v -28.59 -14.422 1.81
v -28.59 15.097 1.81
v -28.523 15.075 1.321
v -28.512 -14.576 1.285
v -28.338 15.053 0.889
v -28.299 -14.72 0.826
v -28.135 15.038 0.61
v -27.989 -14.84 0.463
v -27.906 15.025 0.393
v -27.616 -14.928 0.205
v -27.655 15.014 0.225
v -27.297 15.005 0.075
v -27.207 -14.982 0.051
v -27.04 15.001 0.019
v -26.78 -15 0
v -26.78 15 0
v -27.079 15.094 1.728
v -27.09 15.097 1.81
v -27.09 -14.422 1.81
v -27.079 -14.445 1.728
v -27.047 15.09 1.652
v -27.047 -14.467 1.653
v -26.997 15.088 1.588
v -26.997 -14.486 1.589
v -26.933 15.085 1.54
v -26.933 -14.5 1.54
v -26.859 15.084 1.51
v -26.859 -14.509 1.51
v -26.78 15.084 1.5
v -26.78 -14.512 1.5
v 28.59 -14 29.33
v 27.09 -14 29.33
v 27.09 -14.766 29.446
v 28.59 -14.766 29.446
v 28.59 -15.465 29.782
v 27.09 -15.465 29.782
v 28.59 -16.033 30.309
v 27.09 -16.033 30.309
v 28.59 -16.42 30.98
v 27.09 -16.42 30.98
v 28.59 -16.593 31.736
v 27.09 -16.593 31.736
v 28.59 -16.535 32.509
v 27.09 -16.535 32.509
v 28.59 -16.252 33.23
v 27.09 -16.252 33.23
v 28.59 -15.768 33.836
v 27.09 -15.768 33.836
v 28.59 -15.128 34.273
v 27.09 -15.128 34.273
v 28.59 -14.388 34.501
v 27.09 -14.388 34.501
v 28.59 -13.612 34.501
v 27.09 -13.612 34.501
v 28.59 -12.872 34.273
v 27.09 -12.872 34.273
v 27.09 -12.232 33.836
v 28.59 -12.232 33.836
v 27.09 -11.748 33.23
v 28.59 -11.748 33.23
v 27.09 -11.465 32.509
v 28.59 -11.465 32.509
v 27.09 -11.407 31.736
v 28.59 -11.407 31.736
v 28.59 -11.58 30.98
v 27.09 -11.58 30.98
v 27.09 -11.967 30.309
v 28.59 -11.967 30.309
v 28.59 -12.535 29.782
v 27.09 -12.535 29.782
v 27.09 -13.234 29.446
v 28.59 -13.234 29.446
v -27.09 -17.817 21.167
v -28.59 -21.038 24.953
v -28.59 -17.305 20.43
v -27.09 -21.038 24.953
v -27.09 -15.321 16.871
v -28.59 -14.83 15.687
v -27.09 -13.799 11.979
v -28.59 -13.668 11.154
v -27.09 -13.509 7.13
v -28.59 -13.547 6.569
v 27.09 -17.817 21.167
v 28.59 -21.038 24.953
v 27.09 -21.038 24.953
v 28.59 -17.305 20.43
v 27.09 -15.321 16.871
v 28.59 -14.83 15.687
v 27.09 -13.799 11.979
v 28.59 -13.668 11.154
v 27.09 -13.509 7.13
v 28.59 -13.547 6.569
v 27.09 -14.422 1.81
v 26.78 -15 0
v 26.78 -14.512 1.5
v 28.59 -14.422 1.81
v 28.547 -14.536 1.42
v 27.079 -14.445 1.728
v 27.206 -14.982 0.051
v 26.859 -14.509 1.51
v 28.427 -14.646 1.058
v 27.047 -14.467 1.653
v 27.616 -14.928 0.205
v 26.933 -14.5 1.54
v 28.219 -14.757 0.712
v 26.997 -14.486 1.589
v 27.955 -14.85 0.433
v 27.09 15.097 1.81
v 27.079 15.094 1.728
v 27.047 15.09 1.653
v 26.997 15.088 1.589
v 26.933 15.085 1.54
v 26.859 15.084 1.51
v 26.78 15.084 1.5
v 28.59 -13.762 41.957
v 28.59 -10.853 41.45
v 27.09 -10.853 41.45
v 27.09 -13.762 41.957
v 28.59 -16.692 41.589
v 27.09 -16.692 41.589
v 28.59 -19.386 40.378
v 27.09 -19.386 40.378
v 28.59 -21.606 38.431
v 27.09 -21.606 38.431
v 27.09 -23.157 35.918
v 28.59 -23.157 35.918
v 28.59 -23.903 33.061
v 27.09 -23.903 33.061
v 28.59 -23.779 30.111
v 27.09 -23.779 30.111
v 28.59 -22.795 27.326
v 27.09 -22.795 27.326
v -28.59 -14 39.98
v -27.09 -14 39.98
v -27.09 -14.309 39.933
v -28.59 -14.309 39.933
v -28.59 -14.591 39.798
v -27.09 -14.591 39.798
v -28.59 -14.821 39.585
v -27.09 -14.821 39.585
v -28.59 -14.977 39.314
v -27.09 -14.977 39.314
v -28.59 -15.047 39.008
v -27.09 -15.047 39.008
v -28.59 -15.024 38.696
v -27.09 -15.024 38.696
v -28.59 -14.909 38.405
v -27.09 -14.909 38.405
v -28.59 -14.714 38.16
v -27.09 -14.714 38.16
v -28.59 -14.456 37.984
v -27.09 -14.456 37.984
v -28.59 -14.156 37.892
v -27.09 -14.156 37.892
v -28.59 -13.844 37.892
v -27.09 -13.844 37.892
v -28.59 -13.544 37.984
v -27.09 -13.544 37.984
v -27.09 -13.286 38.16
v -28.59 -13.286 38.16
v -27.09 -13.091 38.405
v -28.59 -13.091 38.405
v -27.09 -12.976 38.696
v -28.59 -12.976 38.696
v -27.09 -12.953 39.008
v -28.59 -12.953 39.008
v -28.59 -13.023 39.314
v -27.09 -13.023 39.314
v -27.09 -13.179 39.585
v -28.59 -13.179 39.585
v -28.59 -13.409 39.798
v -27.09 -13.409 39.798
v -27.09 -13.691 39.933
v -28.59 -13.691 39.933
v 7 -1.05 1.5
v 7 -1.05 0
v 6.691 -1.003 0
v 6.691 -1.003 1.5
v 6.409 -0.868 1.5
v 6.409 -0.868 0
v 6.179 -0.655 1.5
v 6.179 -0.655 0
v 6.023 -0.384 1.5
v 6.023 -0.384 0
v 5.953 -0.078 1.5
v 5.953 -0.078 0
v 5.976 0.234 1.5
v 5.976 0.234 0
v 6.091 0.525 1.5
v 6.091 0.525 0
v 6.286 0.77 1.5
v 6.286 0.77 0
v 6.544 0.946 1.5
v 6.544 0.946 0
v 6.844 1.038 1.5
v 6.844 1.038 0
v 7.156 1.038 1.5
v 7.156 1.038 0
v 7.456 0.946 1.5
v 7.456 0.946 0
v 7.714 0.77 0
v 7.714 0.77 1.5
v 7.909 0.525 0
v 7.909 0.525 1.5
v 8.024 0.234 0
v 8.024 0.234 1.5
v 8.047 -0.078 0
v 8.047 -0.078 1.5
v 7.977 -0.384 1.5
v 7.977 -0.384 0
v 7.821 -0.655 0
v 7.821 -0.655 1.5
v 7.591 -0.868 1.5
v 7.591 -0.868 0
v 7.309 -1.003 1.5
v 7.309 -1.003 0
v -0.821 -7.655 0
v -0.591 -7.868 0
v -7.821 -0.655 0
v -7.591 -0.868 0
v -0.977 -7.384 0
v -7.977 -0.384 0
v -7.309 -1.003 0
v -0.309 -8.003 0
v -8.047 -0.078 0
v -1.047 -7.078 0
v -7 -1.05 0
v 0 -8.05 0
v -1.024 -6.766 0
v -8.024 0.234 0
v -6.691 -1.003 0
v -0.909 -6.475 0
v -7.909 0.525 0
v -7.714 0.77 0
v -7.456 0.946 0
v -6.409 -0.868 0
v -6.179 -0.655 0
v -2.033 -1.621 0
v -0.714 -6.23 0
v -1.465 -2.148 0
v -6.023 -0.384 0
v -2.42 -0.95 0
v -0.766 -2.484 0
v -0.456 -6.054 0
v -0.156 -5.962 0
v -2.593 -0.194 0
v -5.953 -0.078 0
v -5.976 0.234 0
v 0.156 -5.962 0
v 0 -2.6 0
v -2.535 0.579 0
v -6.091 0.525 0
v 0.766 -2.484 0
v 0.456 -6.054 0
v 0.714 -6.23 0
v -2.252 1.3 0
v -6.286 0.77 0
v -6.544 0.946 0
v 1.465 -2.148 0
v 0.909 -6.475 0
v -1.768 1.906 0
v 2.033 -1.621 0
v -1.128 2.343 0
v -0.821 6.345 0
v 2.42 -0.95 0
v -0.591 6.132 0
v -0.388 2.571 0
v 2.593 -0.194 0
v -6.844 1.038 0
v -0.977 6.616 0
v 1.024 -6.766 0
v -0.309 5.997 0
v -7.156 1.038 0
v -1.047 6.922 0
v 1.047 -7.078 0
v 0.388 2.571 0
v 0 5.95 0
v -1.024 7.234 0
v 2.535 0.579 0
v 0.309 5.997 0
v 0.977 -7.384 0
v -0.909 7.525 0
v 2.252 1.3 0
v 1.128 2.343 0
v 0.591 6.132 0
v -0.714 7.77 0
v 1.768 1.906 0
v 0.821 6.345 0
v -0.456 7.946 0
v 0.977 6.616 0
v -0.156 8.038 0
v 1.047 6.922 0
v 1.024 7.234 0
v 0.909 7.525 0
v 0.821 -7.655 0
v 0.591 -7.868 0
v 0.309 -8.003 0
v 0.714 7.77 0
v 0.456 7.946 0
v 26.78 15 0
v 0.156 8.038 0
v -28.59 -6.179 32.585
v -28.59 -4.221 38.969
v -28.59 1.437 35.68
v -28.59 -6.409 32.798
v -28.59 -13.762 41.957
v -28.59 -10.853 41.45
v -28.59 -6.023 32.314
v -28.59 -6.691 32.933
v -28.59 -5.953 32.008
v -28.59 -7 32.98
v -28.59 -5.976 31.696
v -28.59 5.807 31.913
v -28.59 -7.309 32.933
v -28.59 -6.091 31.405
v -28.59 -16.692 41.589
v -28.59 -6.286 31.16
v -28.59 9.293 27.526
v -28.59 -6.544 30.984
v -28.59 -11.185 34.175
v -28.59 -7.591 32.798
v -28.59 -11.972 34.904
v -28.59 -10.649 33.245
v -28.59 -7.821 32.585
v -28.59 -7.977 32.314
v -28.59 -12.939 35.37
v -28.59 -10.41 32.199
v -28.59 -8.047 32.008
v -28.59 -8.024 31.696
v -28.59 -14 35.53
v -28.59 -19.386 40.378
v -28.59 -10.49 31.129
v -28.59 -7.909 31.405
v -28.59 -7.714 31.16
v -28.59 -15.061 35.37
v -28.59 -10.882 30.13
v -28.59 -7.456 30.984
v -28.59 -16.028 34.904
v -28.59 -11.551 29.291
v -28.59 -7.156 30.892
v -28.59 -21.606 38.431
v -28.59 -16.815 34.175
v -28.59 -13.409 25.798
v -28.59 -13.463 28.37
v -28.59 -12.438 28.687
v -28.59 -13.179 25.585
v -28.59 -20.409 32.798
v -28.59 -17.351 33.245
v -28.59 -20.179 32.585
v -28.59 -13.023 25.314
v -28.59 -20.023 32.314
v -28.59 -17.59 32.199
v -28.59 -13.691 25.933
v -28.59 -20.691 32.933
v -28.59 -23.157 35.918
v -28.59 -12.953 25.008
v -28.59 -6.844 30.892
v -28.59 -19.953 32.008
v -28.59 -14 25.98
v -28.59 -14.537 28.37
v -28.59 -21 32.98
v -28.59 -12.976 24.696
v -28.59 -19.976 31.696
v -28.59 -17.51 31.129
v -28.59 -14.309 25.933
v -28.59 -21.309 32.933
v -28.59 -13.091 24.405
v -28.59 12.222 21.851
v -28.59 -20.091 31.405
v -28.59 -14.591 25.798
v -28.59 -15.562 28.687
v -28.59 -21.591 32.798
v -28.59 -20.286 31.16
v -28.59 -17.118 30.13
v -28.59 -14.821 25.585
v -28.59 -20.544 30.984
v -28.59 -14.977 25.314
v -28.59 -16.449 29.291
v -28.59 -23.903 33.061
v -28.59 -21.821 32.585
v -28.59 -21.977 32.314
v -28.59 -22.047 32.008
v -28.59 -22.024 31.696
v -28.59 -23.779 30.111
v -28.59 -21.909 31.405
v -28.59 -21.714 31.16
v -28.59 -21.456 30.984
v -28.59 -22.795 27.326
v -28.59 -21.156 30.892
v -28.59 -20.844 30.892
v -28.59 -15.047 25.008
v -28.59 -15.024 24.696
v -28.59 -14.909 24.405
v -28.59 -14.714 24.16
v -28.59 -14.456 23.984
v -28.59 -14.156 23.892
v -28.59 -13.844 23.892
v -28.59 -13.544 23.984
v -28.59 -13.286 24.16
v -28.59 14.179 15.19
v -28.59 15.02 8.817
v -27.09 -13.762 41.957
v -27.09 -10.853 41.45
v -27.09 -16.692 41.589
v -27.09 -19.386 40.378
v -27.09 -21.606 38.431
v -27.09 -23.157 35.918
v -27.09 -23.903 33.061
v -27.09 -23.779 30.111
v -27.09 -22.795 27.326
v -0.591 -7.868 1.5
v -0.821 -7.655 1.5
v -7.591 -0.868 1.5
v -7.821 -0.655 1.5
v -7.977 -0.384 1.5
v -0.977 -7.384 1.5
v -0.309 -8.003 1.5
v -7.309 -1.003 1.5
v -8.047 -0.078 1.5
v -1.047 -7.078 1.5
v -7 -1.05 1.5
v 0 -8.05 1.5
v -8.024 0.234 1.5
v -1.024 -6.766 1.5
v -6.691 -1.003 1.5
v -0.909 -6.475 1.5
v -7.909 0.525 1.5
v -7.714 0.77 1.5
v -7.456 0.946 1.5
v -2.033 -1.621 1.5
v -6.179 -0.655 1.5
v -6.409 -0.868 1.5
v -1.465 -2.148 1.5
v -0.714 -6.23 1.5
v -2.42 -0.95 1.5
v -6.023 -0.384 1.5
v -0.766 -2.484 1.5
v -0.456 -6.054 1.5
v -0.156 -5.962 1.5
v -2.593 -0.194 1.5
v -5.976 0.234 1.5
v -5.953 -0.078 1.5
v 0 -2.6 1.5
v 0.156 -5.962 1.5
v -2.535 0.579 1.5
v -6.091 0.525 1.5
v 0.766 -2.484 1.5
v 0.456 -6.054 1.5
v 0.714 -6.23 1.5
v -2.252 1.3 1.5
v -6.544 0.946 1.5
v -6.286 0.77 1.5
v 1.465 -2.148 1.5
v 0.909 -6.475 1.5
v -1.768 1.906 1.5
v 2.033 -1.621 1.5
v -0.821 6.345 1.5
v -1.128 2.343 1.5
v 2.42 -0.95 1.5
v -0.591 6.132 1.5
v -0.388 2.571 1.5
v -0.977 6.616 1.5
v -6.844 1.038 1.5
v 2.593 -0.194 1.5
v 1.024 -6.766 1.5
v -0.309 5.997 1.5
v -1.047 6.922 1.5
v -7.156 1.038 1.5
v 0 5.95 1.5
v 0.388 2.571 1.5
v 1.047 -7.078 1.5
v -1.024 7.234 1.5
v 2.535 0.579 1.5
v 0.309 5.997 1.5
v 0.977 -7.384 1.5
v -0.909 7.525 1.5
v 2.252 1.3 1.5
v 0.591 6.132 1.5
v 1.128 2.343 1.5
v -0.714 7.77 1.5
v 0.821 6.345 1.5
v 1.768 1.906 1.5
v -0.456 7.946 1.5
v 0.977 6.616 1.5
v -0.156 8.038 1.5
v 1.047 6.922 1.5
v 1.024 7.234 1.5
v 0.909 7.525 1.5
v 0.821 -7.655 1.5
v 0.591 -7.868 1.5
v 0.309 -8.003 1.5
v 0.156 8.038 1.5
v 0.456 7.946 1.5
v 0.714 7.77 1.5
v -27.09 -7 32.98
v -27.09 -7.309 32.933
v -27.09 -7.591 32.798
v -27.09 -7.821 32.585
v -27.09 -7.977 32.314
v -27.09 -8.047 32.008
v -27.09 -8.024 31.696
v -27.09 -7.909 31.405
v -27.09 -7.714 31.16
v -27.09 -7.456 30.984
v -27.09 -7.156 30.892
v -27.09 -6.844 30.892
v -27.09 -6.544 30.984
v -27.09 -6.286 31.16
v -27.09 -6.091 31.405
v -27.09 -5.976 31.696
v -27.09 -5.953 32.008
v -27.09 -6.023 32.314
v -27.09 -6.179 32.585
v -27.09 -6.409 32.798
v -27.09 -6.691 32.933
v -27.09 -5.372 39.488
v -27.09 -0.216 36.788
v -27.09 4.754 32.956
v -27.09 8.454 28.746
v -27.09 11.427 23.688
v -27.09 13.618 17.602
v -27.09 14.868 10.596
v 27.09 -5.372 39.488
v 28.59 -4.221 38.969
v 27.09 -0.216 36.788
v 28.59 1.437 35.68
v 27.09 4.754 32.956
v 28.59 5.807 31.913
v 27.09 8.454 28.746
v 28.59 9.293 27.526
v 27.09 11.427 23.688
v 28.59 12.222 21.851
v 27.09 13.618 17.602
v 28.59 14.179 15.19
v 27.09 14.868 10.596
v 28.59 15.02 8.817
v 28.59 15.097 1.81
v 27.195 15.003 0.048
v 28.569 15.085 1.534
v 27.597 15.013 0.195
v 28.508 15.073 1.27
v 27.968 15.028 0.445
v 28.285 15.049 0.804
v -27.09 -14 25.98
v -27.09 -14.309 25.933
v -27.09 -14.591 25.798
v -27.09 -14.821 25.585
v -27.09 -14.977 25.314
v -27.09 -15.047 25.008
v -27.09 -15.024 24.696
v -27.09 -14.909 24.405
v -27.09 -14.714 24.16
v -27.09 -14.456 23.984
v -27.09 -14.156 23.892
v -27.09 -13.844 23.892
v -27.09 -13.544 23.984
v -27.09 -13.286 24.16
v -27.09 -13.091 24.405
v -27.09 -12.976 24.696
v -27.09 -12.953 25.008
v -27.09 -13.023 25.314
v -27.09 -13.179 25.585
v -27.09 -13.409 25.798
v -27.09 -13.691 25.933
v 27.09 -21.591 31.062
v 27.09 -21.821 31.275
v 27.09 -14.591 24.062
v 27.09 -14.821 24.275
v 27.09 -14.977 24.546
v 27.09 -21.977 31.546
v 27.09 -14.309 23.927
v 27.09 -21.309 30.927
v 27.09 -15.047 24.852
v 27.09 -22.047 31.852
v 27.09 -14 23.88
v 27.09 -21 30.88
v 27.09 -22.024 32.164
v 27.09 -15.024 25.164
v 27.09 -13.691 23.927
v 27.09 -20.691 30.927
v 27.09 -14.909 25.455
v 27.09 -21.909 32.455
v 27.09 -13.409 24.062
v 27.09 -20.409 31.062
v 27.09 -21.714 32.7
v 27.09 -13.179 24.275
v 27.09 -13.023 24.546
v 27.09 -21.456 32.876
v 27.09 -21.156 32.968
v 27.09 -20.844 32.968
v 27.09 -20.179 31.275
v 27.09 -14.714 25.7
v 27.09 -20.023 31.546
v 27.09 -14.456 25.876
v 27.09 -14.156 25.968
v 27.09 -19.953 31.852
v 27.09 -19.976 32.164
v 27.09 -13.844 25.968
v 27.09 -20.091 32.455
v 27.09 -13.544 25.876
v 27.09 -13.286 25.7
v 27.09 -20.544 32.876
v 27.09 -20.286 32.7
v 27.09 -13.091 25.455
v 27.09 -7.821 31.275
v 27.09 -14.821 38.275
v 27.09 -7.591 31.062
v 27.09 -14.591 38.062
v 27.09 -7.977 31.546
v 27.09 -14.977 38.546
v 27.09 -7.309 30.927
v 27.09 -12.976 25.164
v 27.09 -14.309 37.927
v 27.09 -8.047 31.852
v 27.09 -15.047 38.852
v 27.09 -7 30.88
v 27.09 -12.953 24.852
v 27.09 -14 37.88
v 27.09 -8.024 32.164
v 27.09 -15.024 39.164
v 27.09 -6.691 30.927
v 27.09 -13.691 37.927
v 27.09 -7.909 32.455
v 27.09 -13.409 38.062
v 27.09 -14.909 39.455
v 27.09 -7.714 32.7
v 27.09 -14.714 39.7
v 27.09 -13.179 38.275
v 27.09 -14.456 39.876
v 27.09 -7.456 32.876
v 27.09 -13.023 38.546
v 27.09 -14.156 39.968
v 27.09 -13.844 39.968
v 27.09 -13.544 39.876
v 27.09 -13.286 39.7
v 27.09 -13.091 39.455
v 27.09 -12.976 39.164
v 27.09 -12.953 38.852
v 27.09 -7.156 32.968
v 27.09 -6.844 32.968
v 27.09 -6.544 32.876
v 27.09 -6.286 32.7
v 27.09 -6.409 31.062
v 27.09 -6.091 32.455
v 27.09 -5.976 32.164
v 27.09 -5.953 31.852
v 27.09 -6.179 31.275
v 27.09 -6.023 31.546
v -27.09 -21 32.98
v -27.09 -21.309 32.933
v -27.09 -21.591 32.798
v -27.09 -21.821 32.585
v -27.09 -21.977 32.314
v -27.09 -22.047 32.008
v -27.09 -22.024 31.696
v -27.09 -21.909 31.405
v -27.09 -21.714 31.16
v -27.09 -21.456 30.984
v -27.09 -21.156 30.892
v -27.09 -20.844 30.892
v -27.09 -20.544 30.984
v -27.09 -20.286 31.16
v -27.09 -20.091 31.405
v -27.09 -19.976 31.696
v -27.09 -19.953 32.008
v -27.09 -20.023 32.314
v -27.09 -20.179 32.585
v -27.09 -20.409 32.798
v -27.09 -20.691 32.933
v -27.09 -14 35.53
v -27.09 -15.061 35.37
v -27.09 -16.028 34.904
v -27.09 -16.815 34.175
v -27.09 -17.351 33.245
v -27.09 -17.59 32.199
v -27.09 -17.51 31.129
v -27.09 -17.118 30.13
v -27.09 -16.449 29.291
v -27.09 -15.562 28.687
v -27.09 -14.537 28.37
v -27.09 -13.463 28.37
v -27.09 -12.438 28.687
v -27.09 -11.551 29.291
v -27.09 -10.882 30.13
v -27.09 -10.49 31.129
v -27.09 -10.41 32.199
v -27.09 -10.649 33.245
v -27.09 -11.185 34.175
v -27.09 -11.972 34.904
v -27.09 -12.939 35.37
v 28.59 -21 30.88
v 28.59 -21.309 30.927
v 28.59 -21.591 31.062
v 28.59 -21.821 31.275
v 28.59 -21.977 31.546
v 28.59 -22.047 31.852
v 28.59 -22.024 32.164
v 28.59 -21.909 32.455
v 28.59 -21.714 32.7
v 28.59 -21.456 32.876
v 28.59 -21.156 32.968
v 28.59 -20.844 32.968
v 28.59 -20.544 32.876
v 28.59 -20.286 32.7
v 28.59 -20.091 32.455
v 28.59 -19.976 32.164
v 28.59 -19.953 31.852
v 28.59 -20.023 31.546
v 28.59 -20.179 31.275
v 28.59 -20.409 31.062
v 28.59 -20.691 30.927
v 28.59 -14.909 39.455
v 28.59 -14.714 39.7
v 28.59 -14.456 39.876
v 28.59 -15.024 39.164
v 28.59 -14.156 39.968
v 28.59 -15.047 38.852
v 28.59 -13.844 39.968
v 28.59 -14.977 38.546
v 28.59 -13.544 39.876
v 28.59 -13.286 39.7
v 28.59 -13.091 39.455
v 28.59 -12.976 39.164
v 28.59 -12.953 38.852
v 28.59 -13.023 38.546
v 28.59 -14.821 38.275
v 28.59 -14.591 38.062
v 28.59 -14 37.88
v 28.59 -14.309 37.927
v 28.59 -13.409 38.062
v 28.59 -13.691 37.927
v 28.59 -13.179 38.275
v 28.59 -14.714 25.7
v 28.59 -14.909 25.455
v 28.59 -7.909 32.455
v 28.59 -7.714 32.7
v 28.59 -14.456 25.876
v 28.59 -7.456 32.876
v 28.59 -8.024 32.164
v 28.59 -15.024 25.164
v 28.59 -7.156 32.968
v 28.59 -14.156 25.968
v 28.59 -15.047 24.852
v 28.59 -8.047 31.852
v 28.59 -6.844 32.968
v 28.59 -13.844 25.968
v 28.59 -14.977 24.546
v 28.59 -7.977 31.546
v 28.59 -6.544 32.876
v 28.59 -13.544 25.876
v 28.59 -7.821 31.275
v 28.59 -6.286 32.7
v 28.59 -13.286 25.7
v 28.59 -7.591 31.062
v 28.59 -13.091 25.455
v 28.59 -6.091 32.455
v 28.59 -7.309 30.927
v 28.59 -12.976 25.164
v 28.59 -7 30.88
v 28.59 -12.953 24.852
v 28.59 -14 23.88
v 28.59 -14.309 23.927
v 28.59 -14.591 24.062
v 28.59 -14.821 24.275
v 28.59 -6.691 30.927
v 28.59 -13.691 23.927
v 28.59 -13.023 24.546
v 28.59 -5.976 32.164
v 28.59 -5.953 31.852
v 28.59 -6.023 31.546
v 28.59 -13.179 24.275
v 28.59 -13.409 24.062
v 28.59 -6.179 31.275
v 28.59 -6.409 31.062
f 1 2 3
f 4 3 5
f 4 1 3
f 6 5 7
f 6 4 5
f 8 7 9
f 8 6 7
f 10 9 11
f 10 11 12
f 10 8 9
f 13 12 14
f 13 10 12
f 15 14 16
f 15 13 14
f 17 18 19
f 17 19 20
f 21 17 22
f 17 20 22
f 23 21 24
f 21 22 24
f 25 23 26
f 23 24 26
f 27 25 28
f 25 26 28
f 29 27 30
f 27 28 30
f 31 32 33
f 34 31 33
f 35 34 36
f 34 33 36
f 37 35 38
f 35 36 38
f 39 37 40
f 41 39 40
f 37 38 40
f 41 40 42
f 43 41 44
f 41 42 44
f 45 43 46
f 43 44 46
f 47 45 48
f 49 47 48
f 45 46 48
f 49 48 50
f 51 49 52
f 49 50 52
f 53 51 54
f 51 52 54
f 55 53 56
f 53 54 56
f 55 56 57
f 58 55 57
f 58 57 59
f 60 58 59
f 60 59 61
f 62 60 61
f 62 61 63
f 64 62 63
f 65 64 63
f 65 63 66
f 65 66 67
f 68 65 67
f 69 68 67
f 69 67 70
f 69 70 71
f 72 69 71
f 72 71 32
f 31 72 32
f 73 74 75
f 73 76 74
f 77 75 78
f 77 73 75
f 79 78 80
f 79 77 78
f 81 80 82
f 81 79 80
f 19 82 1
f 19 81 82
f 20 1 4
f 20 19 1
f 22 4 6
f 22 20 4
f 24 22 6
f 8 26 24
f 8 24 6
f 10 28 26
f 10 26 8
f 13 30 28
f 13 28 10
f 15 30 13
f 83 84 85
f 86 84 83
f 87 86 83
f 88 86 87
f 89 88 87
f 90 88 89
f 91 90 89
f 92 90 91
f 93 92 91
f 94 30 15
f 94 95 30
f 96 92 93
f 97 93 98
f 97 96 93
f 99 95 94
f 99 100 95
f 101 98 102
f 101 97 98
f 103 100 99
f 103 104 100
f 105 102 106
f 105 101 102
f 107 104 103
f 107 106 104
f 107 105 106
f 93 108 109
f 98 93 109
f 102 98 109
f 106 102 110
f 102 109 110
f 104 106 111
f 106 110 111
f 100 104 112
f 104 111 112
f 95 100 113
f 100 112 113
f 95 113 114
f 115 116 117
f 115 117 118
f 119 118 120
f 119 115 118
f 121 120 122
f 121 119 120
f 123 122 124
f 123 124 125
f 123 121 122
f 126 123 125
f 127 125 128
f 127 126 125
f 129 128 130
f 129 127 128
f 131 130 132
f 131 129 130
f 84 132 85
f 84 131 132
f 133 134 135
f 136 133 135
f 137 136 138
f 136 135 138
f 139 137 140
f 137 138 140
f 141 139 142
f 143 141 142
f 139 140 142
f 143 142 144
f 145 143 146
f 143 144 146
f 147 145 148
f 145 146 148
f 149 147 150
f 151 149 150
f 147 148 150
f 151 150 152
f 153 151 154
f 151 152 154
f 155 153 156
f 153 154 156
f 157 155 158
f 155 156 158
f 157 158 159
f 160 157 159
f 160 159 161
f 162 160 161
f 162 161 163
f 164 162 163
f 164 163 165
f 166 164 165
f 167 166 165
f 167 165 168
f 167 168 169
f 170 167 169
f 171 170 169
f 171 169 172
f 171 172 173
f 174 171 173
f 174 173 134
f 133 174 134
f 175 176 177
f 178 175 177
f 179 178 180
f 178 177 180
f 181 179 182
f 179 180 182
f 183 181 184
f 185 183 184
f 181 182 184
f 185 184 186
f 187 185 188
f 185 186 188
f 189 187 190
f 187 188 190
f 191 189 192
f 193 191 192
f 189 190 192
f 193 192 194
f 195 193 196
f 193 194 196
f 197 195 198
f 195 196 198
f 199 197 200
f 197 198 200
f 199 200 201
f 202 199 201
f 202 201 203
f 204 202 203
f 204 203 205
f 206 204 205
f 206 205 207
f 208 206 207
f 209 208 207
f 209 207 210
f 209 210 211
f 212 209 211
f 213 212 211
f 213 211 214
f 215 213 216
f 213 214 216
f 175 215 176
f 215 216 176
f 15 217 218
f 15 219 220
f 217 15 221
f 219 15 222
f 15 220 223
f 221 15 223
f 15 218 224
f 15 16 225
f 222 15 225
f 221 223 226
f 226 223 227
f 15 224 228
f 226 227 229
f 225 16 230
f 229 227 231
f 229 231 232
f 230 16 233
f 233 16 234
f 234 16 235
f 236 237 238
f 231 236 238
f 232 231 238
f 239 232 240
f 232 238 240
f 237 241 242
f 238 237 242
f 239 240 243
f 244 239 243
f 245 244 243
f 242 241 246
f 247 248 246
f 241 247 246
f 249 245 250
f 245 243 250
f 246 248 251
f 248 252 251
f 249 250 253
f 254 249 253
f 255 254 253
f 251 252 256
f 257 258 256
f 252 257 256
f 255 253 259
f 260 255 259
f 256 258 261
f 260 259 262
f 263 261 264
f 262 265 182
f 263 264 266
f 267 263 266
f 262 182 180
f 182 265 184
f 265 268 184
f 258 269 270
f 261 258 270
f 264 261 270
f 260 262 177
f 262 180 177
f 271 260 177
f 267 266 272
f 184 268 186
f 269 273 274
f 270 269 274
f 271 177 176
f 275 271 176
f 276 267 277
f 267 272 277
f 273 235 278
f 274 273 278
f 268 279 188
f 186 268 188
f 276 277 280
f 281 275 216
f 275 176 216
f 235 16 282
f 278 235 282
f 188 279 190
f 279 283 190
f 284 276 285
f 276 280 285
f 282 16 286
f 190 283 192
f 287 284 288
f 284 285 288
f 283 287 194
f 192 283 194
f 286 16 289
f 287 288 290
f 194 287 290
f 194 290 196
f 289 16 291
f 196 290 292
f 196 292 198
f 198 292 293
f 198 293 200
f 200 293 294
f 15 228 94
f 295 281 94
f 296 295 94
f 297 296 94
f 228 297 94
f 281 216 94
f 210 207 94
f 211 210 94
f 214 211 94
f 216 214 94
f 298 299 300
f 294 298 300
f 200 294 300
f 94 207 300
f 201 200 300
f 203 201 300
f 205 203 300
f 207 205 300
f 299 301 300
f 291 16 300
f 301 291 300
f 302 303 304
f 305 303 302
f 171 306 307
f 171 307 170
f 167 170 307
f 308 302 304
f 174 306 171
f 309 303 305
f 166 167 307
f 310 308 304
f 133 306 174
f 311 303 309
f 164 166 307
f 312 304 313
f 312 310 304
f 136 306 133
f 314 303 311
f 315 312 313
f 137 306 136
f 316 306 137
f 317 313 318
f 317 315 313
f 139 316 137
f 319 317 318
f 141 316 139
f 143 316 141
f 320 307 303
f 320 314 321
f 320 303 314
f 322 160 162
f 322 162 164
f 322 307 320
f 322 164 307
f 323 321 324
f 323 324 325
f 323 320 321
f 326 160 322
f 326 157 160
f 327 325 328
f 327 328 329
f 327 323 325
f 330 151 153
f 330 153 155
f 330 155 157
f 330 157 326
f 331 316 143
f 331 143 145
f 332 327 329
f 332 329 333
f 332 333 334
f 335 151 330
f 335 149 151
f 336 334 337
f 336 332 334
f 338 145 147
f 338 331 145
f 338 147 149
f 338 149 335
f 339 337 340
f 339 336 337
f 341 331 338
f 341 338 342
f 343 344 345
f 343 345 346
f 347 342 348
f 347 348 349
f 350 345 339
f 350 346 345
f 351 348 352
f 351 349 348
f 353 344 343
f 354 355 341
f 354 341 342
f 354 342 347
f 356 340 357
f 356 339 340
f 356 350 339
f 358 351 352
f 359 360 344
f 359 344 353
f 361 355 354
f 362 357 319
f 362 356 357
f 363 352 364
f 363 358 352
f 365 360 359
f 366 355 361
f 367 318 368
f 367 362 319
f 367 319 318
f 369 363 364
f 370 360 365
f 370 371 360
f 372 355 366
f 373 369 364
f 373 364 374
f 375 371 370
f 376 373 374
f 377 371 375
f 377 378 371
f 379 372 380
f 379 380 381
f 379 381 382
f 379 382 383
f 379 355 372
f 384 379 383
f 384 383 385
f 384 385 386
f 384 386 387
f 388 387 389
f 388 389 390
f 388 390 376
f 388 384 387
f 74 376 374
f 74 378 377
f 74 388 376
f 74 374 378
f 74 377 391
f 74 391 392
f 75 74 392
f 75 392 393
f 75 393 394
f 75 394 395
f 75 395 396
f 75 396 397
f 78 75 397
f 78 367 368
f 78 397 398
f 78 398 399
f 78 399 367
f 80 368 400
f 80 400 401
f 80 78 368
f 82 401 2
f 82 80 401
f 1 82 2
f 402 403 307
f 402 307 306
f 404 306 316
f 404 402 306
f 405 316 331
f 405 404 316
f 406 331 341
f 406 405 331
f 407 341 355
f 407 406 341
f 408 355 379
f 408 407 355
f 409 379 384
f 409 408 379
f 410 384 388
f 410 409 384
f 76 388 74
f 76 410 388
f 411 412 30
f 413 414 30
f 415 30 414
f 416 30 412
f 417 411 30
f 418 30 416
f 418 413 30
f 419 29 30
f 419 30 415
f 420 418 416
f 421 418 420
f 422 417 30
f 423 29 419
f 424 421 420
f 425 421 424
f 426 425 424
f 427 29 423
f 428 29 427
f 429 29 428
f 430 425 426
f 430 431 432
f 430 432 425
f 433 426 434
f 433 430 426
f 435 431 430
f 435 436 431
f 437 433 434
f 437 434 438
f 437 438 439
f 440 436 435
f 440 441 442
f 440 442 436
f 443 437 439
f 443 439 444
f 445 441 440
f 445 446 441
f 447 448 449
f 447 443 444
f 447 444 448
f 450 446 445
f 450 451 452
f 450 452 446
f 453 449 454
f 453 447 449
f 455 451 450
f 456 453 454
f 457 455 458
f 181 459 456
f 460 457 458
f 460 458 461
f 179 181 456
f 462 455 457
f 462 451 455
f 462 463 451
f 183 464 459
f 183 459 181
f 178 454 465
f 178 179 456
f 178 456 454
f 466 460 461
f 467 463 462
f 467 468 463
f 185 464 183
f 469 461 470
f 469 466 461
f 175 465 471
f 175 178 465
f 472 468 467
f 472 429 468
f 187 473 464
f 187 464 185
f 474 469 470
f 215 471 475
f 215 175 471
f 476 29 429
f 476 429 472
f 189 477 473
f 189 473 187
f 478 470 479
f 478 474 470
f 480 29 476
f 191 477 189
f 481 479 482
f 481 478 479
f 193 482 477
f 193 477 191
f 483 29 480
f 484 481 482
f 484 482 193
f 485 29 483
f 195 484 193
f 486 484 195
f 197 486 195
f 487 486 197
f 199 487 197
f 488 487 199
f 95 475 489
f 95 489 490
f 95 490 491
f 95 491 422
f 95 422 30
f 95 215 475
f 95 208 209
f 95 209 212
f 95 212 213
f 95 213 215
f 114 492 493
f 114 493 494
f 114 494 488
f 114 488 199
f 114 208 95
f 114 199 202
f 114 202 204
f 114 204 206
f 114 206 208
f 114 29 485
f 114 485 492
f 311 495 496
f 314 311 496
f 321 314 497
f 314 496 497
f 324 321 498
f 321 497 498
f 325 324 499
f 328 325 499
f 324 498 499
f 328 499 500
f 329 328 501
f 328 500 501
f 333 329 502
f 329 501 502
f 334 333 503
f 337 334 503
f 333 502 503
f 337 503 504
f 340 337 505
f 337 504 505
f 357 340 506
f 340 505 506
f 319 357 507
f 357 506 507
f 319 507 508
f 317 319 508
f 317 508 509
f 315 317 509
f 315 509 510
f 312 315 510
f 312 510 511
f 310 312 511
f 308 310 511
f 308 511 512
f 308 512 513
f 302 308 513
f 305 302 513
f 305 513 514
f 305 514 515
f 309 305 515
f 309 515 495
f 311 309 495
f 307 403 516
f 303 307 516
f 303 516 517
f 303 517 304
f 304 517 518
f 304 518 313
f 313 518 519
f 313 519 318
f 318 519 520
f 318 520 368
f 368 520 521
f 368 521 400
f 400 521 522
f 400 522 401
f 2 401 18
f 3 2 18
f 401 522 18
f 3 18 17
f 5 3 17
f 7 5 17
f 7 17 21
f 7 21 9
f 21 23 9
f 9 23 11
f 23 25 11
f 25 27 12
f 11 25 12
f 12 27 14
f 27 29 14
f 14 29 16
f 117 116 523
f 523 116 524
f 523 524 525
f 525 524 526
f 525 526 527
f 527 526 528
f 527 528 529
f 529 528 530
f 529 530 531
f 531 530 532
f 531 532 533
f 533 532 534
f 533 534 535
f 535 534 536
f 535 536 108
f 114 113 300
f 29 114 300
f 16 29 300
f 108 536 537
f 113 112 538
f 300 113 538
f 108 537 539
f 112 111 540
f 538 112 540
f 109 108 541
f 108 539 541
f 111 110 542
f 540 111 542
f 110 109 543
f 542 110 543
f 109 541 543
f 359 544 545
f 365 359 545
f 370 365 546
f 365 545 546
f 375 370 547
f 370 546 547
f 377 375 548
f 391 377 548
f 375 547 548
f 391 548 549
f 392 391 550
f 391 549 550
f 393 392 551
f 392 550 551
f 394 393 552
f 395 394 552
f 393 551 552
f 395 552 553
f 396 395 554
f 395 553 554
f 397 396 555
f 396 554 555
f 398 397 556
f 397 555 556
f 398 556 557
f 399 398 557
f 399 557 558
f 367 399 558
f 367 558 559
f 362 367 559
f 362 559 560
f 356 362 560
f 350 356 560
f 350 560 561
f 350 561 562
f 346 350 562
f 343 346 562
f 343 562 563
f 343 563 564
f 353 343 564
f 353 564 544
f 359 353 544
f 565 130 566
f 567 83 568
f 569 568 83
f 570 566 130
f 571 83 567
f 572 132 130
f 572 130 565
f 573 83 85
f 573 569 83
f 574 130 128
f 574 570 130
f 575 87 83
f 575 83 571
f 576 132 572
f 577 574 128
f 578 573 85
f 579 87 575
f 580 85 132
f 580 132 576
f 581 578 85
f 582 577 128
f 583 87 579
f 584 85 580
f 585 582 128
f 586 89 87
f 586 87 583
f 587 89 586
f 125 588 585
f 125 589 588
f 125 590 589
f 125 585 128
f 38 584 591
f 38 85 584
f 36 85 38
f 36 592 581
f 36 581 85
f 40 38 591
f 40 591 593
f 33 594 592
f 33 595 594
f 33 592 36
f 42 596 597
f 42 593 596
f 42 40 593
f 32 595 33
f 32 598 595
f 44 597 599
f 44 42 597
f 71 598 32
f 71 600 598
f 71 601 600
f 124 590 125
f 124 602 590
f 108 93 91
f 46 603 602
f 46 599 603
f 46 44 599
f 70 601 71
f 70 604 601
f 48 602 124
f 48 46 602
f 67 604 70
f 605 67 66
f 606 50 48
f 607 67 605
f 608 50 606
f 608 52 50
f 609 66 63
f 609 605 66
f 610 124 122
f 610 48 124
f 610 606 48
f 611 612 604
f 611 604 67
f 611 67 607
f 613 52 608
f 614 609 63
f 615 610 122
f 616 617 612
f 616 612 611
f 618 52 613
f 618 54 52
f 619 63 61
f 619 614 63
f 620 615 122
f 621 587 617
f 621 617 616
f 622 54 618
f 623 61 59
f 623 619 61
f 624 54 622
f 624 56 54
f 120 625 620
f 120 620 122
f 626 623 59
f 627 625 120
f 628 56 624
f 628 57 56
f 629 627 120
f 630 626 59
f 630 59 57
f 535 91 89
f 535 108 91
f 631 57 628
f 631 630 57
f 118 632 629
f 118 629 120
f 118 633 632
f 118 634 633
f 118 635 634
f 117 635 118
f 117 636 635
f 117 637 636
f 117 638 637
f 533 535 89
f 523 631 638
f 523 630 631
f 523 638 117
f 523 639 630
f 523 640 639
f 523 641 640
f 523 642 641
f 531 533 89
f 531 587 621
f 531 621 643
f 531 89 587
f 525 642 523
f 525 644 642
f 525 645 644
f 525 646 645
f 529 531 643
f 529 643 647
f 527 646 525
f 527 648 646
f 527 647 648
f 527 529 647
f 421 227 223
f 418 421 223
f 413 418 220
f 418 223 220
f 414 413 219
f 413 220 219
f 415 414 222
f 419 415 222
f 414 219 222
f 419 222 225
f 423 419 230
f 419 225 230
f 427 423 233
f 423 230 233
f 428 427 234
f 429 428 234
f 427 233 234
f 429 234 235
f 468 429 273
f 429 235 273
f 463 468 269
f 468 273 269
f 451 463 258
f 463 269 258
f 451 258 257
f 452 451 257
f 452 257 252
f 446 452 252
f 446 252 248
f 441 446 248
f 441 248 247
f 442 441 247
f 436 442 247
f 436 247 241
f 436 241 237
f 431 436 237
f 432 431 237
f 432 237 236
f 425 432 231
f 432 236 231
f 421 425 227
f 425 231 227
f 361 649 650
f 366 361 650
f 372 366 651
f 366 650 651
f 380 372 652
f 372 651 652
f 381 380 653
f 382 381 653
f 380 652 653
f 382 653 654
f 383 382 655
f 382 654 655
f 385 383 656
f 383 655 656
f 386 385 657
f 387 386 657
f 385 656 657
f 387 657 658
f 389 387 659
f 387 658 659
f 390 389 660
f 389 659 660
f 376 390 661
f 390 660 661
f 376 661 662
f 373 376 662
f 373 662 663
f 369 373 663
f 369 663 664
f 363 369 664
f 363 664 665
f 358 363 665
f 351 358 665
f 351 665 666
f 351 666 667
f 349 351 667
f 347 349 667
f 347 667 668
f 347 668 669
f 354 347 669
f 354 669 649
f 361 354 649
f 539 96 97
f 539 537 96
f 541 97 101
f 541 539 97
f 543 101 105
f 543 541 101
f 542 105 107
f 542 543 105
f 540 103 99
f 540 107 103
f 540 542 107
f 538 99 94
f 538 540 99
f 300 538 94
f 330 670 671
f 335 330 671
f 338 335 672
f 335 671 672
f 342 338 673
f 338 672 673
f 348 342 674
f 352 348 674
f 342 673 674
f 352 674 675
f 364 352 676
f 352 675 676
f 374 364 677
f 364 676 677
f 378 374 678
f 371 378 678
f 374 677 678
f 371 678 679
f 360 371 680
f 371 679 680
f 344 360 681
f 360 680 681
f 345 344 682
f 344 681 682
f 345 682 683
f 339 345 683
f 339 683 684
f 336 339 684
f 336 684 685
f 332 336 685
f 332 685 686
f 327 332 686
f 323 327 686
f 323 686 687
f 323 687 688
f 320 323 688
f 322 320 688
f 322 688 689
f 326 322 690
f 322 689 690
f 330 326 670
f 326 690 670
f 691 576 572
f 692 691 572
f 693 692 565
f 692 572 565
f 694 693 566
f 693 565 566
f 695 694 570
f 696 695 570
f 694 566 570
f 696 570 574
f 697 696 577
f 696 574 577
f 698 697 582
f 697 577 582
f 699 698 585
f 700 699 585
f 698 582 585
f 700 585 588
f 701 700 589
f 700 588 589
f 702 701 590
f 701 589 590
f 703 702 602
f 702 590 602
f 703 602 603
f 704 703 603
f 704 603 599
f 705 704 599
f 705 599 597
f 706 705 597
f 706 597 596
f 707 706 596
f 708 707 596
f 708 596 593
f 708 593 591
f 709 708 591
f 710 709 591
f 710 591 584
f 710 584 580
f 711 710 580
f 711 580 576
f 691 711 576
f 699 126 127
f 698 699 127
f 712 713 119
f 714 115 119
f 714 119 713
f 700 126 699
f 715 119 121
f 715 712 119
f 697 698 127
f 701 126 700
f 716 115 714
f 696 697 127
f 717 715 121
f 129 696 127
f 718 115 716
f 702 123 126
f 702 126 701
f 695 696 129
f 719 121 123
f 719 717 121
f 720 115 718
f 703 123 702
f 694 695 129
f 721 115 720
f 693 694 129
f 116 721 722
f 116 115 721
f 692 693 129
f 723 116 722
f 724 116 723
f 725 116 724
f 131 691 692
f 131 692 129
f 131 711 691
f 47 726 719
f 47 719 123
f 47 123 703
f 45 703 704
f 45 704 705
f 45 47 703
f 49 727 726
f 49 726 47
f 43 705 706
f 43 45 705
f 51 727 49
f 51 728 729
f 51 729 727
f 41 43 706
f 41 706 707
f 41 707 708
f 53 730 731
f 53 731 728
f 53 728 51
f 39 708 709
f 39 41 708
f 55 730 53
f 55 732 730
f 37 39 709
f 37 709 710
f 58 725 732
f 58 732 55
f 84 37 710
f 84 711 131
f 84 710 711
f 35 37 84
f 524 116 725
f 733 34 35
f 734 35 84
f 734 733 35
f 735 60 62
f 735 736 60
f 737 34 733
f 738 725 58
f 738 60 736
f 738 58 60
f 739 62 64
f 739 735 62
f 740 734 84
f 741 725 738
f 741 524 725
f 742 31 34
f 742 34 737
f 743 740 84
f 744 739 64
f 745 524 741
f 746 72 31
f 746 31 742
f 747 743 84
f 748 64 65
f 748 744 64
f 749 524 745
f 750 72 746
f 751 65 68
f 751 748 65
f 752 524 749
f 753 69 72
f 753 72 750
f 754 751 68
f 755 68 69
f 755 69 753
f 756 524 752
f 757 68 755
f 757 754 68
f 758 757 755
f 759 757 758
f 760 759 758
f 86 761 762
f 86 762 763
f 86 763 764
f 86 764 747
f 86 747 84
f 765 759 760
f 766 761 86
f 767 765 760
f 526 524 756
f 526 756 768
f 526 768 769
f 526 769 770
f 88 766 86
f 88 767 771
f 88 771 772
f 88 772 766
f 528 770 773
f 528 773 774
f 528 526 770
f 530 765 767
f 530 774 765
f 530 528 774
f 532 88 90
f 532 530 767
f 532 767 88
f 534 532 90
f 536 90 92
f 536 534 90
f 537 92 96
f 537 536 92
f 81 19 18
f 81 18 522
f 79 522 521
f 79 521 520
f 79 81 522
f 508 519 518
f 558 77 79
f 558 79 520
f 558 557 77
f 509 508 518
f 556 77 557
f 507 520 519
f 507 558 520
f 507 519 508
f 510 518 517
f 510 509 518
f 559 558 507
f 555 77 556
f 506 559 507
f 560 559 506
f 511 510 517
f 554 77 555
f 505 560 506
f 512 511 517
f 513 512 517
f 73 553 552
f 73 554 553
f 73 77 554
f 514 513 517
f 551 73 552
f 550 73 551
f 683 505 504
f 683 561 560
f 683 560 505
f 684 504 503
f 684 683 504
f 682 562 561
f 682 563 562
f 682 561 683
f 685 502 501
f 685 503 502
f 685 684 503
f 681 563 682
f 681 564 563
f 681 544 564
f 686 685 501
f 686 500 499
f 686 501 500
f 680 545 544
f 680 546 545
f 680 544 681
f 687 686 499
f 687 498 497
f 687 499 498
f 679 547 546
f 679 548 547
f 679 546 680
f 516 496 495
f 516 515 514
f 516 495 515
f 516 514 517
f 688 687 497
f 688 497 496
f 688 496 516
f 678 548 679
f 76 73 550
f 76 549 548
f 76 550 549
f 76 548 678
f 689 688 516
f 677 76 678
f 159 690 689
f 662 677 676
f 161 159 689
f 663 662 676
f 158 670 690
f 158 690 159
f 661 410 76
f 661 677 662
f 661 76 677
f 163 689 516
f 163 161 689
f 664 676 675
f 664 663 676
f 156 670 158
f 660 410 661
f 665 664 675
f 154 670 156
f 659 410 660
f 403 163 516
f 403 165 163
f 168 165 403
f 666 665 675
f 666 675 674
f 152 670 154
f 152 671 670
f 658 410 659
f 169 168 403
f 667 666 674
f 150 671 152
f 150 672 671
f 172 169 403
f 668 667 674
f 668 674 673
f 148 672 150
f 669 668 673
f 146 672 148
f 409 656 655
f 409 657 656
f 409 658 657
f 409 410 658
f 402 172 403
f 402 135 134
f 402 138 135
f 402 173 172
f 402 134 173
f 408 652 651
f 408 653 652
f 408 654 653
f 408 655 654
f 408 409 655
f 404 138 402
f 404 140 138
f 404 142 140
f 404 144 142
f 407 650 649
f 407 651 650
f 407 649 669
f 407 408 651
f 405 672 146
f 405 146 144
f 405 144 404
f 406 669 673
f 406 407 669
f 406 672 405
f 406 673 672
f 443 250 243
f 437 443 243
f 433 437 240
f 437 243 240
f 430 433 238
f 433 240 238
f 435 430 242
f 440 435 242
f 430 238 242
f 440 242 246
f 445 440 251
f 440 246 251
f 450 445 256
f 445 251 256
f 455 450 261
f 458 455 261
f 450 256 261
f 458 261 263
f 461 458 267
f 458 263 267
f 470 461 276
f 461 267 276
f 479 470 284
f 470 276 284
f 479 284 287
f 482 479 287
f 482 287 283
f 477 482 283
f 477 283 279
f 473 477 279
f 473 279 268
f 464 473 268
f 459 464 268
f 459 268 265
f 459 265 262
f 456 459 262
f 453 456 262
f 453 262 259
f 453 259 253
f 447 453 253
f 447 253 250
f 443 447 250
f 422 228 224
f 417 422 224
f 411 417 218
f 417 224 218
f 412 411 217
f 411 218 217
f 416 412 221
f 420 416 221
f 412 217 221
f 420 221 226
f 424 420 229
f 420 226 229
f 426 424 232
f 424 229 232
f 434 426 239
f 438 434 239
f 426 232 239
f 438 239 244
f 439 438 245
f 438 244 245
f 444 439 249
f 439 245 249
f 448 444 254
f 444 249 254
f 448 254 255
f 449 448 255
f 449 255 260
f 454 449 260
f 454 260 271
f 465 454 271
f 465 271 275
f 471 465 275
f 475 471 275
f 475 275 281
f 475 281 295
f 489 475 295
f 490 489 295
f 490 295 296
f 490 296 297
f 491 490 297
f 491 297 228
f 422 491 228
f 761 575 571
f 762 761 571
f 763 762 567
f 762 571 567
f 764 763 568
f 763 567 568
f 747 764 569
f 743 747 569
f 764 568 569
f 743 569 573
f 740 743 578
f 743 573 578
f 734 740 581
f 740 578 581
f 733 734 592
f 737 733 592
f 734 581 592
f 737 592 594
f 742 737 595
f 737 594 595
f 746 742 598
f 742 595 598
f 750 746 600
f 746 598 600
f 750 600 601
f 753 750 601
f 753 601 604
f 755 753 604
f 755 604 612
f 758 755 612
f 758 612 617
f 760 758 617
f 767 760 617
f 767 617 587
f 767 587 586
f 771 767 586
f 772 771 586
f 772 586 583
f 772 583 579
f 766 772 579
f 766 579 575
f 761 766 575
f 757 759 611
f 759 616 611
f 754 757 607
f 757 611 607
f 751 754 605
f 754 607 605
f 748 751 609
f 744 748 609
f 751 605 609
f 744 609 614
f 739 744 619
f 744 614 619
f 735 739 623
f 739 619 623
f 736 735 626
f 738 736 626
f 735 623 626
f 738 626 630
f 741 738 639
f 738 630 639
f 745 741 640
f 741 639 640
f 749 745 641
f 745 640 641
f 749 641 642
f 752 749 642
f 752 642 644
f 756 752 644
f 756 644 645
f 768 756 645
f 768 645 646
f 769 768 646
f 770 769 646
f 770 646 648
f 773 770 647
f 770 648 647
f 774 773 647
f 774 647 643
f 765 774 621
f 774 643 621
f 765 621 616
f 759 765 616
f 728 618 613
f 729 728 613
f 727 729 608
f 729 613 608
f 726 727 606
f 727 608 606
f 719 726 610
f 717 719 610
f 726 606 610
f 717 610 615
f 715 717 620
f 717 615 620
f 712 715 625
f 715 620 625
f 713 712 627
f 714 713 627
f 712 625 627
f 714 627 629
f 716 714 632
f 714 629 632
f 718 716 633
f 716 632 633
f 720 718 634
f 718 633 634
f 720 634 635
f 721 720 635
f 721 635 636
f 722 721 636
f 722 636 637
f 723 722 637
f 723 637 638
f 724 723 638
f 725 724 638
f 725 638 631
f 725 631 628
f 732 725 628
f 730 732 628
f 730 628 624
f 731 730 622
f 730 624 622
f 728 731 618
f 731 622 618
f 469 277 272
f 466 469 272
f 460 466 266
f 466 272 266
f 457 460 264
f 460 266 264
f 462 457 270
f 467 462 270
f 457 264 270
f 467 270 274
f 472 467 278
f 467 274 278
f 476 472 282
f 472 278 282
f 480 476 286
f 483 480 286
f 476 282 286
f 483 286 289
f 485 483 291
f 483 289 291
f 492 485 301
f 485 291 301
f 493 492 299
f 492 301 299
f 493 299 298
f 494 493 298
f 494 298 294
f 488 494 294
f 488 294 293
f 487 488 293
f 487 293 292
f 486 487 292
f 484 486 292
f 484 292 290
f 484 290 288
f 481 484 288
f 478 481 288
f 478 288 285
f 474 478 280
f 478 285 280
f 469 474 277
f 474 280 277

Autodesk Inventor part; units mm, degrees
ref_plane "YZ Plane" through (0, 0, 0) normal (1, 0, 0) x (0, 1, 0)
ref_plane "XZ Plane" through (0, 0, 0) normal (0, 1, 0) x (-1, 0, 0)
ref_plane "XY Plane" through (0, 0, 0) normal (0, 0, 1) x (1, 0, 0)
sketch "Sketch1" plane through (0, 0, 0) normal (0, 0, 1) x (1, 0, 0)
  line L0 (-28.59, -25) -> (28.59, -25)
  line L1 (28.59, -25) -> (28.59, 25)
  line L2 (28.59, 25) -> (-28.59, 25)
  line L3 (-28.59, 25) -> (-28.59, -25)
  line L4 (-28.59, -25) -> (28.59, 25) construction
  line L5 (28.59, -25) -> (-28.59, 25) construction
  point P0 (0, 0)
  dimension "d0" = 57.18
  dimension "d1" = 50
extrude "Plate1" add sketch "Sketch1" along normal blind 1.5
sketch "Sketch2" plane through (-27.09, -25, 0) normal (-1, 0, 0) x (0, -1, 0)
  line L0 (-50, 0) -> (0, 0)
  line L1 (0, 0) -> (0, 45)
  line L2 (0, 45) -> (-50, 45)
  line L3 (-50, 45) -> (-50, 0)
edge flange "Flange1" height 45 angle 90 thickness 1.5 bend radius 0.31 thickness toward (-1, 0, 0) relief tear relief width 1.5 relief depth 0.75 corner gap 0.31 corner form 0 edges at (-28.59, 0, 1.5) (28.59, 0, 1.5) wall of the first edge with corners at (-27.09, 25, 0) (-27.09, -25, 0) (-27.09, -25, 45) (-27.09, 25, 45)
bend "Bend1"
corner "Corner1"
sketch "Sketch17" plane through (0, 0, 1.5) normal (0, 0, 1) x (1, 0, 0)
  circle A0 centre (0, 7) radius 0.7835
  circle A1 centre (7, 0) radius 0.7835
  circle A2 centre (0, -7) radius 0.7835
  circle A3 centre (-7, 0) radius 0.7835
  point P0 (0, 0)
hole "Hole7" at (0, 7, 1.5) at (7, 0, 1.5) at (0, -7, 1.5) at (-7, 0, 1.5) direction (0, 0, -1) diameter 2.1 depth 1.5
sketch "Sketch26" plane through (28.59, -25, 45) normal (1, 0, 0) x (0, 0, -1)
  arc A0 (3.5502, 14.1468) -> (20.0473, 3.9617) centre (13, 11) ccw
  line L0 (45, 50) -> (45, 0) projected
  spline S0 degree 2 poles (3.5502, 14.1468) (11.7245, 42.1837) (45, 40) knots 0 0 0 1 1 1
  spline S1 degree 2 poles (20.0473, 3.9617) (31.1315, 14.9193) (45, 10) knots 0 0 0 1 1 1
  line L1 (45, 10) -> (45, 40)
  line L2 (0, 0) -> (45, 0)
  line L3 (45, 0) -> (45, 50)
  line L4 (45, 50) -> (0, 50)
  line L5 (0, 50) -> (0, 0)
  point P0 (45, 25)
  point P1 (45, 25)
  point P2 (17.1562, 34.0829)
  point P3 (32.0366, 10.9995)
  dimension "d143" = 19.92
  dimension "d144" = 32
  dimension "d145" = 14
  dimension "d160" = 15
  dimension "d161" = 15
  dimension "d162" = 7.0473
  dimension "d163" = 9.4498
  dimension "d164" = 19.0366
  dimension "d165" = 7.0378
  dimension "d166" = 13.606
  dimension "d167" = 19.9361
extrude "Cut8" cut sketch "Sketch26" against normal blind 57.18 contours A0 S1 L0 L2 L5 L4 S0
sketch "Sketch27" plane through (-28.59, -14.4222, 1.81) normal (-1, 0, 0) x (0, 0, 1)
  circle A0 centre (23.12, 0.4222) radius 0.7835 projected
  circle A1 centre (30.12, -6.5778) radius 0.7835 projected
  circle A2 centre (30.12, 7.4222) radius 0.7835 projected
  circle A3 centre (37.12, 0.4222) radius 0.7835 projected
  point P0 (-1.81, 14.4222)
hole "Hole15" at (-28.59, -14, 24.93) at (-28.59, -7, 31.93) at (-28.59, -21, 31.93) at (-28.59, -14, 38.93) direction (1, 0, 0) diameter 2.1 depth 1.5
sketch "Sketch28" plane through (28.59, -14.4222, 1.81) normal (1, 0, 0) x (0, 0, -1)
  circle A0 centre (-23.12, 0.4222) radius 0.7835 projected
  circle A1 centre (-30.12, -6.5778) radius 0.7835 projected
  circle A2 centre (-37.12, 0.4222) radius 0.7835 projected
  circle A3 centre (-30.12, 7.4222) radius 0.7835 projected
  point P0 (1.81, 14.4222)
hole "Hole16" at (28.59, -14, 24.93) at (28.59, -7, 31.93) at (28.59, -21, 31.93) at (28.59, -14, 38.93) direction (-1, 0, 0) diameter 2.1 depth 1.5
sketch "Sketch29" plane through (-28.59, -14.4222, 1.81) normal (-1, 0, 0) x (0, 0, 1)
  circle A0 centre (30.12, 0.4222) radius 1.2295 projected
  point P0 (-1.81, 14.4222)
hole "Hole17" at (-28.59, -14, 31.93) direction (1, 0, 0) diameter 7.2 depth 1.5
sketch "Sketch30" plane through (28.59, -14.4222, 1.81) normal (1, 0, 0) x (0, 0, -1)
  circle A0 centre (-30.12, 0.4222) radius 1.75 projected
  point P0 (1.81, 14.4222)
hole "Hole18" at (28.59, -14, 31.93) direction (-1, 0, 0) diameter 5.2 depth 1.5
sketch "Sketch31" plane through (0, 0, 1.5) normal (0, 0, 1) x (1, 0, 0)
  circle A0 centre (0, 0) radius 1.75 projected
  point P0 (0, 0)
hole "Hole19" at (0, 0, 1.5) direction (0, 0, -1) diameter 5.2 depth 1.5
equation "\"d90\" = Thickness"
equation "\"d2\" = Thickness"
equation "\"d3\" = BendReliefWidth"
equation "\"d4\" = BendReliefDepth"
equation "\"d5\" = MinimumRemnant"
equation "\"d6\" = TransitionRadius"
equation "\"d9\" = BendRadius"
equation "\"d10\" = CornerReliefSize"
equation "\"d11\" = GapSize"
equation "\"d12\" = JacobiRadiusSize"
equation "\"BendReliefWidth\" = Thickness"
equation "\"BendReliefDepth\" = 0.5 * Thickness"
equation "\"CornerReliefSize\" = 4 * Thickness"
equation "\"MinimumRemnant\" = 2 * Thickness"
equation "\"TransitionRadius\" = BendRadius"
equation "\"JacobiRadiusSize\" = BendRadius"
equation "\"GapSize\" = Thickness"
equation "\"Thickness\" = 1.5"
equation "\"BendRadius\" = 0.31"
properties part number "axis_15_bottom_frame" material "Aluminum 6061-AHC"
